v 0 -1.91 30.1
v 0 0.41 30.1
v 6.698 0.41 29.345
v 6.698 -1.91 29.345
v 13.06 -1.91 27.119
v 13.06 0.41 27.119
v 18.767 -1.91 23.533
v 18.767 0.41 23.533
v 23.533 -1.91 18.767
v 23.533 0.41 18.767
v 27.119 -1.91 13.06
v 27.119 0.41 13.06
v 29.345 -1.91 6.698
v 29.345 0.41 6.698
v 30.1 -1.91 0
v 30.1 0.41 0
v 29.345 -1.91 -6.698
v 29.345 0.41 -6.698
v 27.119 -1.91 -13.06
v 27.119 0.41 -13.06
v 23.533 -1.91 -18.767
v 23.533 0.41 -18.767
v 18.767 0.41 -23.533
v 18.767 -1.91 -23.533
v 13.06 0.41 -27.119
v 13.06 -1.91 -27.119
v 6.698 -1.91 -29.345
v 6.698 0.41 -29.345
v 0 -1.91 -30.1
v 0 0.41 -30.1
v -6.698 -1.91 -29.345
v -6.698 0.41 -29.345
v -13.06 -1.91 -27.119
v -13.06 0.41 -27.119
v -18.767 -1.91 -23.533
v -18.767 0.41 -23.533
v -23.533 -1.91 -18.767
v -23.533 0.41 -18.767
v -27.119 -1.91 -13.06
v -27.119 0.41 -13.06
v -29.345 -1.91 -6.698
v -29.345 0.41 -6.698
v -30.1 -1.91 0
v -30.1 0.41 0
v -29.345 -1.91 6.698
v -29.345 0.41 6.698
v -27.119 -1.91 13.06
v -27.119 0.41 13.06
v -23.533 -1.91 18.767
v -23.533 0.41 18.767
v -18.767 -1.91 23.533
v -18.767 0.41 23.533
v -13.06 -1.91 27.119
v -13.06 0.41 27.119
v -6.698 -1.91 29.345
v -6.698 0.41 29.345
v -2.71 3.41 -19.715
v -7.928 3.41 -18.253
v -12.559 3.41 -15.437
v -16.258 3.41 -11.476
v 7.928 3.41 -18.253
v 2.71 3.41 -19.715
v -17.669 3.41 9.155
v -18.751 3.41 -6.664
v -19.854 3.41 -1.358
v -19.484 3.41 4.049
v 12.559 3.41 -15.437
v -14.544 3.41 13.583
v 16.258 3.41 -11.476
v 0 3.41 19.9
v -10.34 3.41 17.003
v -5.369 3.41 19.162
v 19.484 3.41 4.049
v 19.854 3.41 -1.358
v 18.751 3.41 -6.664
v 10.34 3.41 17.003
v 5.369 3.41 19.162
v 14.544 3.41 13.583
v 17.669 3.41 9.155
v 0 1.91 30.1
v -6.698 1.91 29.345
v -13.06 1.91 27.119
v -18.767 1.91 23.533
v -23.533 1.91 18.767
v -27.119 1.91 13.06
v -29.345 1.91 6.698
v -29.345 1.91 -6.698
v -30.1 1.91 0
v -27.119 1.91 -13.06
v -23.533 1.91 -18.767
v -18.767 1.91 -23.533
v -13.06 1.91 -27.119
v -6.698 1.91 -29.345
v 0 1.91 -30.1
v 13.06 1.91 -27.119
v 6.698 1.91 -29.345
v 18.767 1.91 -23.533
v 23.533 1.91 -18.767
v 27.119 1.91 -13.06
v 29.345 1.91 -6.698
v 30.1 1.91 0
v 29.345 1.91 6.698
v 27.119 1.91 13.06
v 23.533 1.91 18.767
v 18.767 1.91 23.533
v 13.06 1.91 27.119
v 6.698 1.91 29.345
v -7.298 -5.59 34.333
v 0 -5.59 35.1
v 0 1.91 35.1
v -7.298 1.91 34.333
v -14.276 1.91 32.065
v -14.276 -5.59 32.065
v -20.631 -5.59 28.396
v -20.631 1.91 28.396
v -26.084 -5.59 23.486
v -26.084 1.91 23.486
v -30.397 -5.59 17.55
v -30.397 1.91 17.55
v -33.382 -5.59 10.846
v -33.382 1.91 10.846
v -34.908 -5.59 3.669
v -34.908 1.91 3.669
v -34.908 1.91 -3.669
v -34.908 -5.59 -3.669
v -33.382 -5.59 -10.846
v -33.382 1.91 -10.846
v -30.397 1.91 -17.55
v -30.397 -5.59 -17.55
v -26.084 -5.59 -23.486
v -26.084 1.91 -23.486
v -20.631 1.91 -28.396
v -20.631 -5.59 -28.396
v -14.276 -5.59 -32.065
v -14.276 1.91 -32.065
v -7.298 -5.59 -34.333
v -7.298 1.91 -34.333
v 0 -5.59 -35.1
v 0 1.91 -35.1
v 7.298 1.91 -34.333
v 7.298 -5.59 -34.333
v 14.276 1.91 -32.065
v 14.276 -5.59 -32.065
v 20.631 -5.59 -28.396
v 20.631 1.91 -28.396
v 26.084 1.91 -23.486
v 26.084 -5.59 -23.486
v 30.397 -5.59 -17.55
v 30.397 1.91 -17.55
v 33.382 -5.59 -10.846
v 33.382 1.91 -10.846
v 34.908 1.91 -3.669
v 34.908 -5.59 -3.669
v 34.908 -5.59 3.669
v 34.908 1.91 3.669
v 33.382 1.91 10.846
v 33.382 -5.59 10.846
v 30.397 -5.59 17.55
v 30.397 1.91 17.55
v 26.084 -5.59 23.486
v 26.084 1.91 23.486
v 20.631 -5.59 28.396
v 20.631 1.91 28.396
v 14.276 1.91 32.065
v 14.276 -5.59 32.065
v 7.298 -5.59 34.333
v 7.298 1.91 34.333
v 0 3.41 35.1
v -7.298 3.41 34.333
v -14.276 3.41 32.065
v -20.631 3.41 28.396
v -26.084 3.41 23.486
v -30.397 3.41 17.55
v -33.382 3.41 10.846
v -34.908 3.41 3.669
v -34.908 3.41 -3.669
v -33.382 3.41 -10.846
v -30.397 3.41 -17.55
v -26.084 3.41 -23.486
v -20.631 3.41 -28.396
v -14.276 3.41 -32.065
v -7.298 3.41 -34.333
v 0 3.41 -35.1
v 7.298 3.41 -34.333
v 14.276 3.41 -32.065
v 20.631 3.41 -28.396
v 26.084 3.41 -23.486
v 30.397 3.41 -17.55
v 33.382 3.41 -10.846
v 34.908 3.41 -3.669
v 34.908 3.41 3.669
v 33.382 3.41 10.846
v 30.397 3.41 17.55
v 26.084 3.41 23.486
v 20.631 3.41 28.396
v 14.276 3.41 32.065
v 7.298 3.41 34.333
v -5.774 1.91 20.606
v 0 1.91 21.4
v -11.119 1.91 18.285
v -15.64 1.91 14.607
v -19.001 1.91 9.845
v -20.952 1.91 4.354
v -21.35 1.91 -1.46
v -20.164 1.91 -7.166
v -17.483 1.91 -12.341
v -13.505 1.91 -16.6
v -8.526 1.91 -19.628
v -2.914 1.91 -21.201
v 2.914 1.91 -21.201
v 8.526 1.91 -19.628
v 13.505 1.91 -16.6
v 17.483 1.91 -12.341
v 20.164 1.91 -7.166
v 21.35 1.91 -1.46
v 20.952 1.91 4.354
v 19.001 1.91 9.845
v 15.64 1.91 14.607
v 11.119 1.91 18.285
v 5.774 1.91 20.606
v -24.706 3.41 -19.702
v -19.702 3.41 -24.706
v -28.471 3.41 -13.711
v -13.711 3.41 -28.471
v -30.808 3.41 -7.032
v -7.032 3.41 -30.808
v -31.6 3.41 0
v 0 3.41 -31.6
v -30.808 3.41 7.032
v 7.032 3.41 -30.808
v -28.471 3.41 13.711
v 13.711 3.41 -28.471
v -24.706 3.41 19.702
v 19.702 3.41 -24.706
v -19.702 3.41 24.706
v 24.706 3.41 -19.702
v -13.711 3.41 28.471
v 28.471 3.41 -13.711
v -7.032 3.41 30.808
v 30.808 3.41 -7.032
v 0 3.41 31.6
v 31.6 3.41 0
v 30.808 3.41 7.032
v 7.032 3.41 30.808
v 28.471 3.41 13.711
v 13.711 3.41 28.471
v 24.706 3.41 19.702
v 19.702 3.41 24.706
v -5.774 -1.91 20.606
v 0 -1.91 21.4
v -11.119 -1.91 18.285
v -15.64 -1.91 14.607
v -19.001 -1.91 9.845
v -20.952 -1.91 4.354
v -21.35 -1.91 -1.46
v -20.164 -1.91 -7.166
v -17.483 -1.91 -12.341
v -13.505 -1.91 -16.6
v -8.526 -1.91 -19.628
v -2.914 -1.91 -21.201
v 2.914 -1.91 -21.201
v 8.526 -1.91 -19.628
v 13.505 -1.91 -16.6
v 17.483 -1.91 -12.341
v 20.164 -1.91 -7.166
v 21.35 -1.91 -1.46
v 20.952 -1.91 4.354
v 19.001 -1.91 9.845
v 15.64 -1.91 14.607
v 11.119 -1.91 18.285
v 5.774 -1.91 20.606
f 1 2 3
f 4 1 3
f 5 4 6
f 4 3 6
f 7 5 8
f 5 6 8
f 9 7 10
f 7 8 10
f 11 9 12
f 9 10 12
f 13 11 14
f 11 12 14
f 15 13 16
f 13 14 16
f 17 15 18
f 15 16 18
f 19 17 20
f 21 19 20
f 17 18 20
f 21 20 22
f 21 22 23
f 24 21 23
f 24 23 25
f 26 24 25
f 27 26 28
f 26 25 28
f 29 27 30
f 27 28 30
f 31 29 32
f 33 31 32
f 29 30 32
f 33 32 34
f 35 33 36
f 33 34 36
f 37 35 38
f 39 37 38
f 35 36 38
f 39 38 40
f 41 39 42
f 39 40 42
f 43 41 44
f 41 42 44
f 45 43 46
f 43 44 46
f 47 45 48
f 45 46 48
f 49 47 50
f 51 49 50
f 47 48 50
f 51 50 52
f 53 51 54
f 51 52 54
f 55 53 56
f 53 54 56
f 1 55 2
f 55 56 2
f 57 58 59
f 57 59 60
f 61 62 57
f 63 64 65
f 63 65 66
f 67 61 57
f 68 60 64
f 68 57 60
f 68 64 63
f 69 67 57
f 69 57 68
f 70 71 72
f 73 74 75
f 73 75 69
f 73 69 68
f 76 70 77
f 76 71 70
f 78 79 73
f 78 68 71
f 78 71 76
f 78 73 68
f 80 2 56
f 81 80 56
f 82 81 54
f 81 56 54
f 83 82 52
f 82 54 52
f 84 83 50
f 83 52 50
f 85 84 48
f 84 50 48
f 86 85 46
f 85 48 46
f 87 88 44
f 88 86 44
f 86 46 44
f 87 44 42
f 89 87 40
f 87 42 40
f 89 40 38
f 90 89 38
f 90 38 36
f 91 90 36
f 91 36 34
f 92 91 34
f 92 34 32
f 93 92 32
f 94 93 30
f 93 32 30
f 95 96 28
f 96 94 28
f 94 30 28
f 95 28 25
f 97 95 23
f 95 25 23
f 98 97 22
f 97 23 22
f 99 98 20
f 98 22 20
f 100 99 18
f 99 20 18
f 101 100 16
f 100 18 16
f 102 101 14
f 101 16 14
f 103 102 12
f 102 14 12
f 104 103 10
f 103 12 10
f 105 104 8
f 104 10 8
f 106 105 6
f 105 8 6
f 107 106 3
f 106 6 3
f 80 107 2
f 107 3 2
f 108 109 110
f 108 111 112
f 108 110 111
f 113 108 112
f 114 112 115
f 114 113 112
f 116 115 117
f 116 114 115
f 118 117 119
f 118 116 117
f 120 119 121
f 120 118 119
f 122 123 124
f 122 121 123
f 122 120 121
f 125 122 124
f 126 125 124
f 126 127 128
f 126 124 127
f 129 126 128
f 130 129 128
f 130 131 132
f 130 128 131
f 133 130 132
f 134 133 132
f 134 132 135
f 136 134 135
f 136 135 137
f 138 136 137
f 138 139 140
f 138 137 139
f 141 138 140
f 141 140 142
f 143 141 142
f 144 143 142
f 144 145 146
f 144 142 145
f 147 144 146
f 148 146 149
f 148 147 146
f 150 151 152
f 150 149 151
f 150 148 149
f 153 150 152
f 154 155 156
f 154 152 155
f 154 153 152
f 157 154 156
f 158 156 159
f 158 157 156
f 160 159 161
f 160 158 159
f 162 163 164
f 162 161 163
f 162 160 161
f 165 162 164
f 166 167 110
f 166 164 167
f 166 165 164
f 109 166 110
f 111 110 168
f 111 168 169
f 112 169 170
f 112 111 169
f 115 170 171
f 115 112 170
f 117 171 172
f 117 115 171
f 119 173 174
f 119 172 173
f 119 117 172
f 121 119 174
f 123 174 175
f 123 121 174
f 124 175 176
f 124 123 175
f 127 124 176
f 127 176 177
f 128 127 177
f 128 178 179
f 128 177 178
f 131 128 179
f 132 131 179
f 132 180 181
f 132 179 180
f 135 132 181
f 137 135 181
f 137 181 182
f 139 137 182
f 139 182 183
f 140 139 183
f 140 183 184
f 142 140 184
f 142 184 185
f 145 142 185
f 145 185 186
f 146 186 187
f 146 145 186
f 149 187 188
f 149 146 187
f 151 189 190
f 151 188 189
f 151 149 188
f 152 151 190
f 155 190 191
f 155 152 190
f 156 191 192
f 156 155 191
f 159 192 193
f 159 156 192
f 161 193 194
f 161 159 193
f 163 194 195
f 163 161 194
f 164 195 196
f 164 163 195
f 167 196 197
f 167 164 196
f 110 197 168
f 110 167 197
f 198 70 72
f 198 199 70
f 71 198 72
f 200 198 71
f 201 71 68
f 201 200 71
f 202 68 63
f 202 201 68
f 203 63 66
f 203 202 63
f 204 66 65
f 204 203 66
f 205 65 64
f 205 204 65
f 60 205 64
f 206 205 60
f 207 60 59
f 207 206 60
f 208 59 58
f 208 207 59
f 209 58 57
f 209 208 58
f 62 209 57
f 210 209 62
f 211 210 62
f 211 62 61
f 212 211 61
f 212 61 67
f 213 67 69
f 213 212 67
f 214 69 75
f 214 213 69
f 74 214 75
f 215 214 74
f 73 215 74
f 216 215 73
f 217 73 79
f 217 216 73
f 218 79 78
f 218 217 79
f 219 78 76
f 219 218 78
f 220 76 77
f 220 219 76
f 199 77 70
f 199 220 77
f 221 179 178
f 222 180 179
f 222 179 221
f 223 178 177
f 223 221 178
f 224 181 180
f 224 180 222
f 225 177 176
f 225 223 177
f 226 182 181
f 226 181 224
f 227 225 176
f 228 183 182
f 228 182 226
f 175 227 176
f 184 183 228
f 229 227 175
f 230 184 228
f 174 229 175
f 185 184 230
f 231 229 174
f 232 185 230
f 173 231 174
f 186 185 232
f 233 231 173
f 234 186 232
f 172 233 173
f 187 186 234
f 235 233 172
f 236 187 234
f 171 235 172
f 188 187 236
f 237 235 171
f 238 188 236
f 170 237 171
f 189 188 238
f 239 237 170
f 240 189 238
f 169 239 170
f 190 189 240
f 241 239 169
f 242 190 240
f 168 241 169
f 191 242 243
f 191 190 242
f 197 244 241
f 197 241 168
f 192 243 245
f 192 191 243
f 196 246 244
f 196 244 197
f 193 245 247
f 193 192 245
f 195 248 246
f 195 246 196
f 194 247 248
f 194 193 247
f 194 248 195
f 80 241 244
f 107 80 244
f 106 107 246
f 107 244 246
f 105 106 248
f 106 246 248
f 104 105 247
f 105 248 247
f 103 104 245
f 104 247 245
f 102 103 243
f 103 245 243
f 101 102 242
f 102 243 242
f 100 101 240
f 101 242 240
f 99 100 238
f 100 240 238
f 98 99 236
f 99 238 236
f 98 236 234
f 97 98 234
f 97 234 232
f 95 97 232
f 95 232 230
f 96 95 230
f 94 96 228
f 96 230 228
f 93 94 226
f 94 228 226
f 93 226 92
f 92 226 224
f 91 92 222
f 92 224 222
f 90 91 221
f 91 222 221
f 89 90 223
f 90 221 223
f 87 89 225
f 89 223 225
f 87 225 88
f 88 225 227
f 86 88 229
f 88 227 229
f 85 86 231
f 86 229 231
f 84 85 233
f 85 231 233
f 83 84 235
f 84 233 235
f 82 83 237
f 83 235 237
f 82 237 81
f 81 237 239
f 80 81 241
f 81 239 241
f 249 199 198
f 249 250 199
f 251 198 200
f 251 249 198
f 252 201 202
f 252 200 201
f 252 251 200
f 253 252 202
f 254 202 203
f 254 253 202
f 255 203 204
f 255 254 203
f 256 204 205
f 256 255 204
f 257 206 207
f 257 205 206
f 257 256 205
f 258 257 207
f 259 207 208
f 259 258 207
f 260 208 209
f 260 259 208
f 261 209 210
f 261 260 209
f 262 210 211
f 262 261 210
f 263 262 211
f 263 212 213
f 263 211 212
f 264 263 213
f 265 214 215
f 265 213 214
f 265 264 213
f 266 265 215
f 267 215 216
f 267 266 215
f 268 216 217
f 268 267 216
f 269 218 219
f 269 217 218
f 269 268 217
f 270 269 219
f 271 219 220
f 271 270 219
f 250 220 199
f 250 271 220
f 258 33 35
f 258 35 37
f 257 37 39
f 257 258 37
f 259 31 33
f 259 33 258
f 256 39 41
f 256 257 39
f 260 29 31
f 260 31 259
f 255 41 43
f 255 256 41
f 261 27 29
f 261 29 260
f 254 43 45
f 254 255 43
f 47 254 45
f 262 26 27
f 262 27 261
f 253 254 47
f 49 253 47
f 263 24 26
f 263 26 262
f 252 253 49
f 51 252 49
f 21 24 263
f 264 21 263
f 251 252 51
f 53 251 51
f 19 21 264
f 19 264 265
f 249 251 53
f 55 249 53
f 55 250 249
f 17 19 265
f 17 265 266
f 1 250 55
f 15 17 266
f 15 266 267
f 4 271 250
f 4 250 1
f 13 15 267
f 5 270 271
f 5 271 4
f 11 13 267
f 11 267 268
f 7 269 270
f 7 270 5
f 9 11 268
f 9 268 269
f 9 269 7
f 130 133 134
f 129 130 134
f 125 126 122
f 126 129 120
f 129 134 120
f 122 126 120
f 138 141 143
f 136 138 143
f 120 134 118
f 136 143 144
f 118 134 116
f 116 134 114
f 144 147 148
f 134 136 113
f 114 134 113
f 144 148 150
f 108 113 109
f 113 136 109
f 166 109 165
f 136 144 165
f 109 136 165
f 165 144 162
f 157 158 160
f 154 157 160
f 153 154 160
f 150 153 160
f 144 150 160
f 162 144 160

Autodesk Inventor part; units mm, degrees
ref_plane "YZ Plane" through (0, 0, 0) normal (1, 0, 0) x (0, 1, 0)
ref_plane "XZ Plane" through (0, 0, 0) normal (0, 1, 0) x (-1, 0, 0)
ref_plane "XY Plane" through (0, 0, 0) normal (0, 0, 1) x (1, 0, 0)
sketch "Sketch1" plane through (0, 0, 0) normal (1, 0, 0) x (0, 1, 0)
  line L0 (1.91, 21.4) -> (-1.91, 21.4)
  line L1 (-1.91, 21.4) -> (-1.91, 30.1)
  line L2 (-1.91, 30.1) -> (1.91, 30.1)
  line L3 (1.91, 21.4) -> (1.91, 0)
  line L4 (1.91, 30.1) -> (1.91, 35.1)
  line L5 (1.91, 35.1) -> (-5.59, 35.1)
  line L6 (-5.59, 35.1) -> (-5.59, 0)
  line L7 (-5.59, 0) -> (1.91, 0)
  point P0 (0, 0)
  dimension "d4" = 5
  dimension "d5" = 7.5
revolve "Revolution1" add sketch "Sketch1" angle 360 about axis through (0, -5.59, 0) along (0, 1, 0)
chamfer "Chamfer1" distance 1.5 angle 45 2 edges at (0, 1.91, -30.1) (0, 1.91, -21.4)
move faces "Move1" translate (0, 1.5, 0) faces at (6.585, 1.91, -0.7996) (-3.3526, 0.91, 20.6294) (-2.5025, 1.41, 30.9992) (3.8791, 1.91, -32.3815)
ref_plane "Work Plane1" through (0, 6.29, 0) normal (0, 1, 0) x (1, 0, 0)
properties part number "Spinner_Base"
